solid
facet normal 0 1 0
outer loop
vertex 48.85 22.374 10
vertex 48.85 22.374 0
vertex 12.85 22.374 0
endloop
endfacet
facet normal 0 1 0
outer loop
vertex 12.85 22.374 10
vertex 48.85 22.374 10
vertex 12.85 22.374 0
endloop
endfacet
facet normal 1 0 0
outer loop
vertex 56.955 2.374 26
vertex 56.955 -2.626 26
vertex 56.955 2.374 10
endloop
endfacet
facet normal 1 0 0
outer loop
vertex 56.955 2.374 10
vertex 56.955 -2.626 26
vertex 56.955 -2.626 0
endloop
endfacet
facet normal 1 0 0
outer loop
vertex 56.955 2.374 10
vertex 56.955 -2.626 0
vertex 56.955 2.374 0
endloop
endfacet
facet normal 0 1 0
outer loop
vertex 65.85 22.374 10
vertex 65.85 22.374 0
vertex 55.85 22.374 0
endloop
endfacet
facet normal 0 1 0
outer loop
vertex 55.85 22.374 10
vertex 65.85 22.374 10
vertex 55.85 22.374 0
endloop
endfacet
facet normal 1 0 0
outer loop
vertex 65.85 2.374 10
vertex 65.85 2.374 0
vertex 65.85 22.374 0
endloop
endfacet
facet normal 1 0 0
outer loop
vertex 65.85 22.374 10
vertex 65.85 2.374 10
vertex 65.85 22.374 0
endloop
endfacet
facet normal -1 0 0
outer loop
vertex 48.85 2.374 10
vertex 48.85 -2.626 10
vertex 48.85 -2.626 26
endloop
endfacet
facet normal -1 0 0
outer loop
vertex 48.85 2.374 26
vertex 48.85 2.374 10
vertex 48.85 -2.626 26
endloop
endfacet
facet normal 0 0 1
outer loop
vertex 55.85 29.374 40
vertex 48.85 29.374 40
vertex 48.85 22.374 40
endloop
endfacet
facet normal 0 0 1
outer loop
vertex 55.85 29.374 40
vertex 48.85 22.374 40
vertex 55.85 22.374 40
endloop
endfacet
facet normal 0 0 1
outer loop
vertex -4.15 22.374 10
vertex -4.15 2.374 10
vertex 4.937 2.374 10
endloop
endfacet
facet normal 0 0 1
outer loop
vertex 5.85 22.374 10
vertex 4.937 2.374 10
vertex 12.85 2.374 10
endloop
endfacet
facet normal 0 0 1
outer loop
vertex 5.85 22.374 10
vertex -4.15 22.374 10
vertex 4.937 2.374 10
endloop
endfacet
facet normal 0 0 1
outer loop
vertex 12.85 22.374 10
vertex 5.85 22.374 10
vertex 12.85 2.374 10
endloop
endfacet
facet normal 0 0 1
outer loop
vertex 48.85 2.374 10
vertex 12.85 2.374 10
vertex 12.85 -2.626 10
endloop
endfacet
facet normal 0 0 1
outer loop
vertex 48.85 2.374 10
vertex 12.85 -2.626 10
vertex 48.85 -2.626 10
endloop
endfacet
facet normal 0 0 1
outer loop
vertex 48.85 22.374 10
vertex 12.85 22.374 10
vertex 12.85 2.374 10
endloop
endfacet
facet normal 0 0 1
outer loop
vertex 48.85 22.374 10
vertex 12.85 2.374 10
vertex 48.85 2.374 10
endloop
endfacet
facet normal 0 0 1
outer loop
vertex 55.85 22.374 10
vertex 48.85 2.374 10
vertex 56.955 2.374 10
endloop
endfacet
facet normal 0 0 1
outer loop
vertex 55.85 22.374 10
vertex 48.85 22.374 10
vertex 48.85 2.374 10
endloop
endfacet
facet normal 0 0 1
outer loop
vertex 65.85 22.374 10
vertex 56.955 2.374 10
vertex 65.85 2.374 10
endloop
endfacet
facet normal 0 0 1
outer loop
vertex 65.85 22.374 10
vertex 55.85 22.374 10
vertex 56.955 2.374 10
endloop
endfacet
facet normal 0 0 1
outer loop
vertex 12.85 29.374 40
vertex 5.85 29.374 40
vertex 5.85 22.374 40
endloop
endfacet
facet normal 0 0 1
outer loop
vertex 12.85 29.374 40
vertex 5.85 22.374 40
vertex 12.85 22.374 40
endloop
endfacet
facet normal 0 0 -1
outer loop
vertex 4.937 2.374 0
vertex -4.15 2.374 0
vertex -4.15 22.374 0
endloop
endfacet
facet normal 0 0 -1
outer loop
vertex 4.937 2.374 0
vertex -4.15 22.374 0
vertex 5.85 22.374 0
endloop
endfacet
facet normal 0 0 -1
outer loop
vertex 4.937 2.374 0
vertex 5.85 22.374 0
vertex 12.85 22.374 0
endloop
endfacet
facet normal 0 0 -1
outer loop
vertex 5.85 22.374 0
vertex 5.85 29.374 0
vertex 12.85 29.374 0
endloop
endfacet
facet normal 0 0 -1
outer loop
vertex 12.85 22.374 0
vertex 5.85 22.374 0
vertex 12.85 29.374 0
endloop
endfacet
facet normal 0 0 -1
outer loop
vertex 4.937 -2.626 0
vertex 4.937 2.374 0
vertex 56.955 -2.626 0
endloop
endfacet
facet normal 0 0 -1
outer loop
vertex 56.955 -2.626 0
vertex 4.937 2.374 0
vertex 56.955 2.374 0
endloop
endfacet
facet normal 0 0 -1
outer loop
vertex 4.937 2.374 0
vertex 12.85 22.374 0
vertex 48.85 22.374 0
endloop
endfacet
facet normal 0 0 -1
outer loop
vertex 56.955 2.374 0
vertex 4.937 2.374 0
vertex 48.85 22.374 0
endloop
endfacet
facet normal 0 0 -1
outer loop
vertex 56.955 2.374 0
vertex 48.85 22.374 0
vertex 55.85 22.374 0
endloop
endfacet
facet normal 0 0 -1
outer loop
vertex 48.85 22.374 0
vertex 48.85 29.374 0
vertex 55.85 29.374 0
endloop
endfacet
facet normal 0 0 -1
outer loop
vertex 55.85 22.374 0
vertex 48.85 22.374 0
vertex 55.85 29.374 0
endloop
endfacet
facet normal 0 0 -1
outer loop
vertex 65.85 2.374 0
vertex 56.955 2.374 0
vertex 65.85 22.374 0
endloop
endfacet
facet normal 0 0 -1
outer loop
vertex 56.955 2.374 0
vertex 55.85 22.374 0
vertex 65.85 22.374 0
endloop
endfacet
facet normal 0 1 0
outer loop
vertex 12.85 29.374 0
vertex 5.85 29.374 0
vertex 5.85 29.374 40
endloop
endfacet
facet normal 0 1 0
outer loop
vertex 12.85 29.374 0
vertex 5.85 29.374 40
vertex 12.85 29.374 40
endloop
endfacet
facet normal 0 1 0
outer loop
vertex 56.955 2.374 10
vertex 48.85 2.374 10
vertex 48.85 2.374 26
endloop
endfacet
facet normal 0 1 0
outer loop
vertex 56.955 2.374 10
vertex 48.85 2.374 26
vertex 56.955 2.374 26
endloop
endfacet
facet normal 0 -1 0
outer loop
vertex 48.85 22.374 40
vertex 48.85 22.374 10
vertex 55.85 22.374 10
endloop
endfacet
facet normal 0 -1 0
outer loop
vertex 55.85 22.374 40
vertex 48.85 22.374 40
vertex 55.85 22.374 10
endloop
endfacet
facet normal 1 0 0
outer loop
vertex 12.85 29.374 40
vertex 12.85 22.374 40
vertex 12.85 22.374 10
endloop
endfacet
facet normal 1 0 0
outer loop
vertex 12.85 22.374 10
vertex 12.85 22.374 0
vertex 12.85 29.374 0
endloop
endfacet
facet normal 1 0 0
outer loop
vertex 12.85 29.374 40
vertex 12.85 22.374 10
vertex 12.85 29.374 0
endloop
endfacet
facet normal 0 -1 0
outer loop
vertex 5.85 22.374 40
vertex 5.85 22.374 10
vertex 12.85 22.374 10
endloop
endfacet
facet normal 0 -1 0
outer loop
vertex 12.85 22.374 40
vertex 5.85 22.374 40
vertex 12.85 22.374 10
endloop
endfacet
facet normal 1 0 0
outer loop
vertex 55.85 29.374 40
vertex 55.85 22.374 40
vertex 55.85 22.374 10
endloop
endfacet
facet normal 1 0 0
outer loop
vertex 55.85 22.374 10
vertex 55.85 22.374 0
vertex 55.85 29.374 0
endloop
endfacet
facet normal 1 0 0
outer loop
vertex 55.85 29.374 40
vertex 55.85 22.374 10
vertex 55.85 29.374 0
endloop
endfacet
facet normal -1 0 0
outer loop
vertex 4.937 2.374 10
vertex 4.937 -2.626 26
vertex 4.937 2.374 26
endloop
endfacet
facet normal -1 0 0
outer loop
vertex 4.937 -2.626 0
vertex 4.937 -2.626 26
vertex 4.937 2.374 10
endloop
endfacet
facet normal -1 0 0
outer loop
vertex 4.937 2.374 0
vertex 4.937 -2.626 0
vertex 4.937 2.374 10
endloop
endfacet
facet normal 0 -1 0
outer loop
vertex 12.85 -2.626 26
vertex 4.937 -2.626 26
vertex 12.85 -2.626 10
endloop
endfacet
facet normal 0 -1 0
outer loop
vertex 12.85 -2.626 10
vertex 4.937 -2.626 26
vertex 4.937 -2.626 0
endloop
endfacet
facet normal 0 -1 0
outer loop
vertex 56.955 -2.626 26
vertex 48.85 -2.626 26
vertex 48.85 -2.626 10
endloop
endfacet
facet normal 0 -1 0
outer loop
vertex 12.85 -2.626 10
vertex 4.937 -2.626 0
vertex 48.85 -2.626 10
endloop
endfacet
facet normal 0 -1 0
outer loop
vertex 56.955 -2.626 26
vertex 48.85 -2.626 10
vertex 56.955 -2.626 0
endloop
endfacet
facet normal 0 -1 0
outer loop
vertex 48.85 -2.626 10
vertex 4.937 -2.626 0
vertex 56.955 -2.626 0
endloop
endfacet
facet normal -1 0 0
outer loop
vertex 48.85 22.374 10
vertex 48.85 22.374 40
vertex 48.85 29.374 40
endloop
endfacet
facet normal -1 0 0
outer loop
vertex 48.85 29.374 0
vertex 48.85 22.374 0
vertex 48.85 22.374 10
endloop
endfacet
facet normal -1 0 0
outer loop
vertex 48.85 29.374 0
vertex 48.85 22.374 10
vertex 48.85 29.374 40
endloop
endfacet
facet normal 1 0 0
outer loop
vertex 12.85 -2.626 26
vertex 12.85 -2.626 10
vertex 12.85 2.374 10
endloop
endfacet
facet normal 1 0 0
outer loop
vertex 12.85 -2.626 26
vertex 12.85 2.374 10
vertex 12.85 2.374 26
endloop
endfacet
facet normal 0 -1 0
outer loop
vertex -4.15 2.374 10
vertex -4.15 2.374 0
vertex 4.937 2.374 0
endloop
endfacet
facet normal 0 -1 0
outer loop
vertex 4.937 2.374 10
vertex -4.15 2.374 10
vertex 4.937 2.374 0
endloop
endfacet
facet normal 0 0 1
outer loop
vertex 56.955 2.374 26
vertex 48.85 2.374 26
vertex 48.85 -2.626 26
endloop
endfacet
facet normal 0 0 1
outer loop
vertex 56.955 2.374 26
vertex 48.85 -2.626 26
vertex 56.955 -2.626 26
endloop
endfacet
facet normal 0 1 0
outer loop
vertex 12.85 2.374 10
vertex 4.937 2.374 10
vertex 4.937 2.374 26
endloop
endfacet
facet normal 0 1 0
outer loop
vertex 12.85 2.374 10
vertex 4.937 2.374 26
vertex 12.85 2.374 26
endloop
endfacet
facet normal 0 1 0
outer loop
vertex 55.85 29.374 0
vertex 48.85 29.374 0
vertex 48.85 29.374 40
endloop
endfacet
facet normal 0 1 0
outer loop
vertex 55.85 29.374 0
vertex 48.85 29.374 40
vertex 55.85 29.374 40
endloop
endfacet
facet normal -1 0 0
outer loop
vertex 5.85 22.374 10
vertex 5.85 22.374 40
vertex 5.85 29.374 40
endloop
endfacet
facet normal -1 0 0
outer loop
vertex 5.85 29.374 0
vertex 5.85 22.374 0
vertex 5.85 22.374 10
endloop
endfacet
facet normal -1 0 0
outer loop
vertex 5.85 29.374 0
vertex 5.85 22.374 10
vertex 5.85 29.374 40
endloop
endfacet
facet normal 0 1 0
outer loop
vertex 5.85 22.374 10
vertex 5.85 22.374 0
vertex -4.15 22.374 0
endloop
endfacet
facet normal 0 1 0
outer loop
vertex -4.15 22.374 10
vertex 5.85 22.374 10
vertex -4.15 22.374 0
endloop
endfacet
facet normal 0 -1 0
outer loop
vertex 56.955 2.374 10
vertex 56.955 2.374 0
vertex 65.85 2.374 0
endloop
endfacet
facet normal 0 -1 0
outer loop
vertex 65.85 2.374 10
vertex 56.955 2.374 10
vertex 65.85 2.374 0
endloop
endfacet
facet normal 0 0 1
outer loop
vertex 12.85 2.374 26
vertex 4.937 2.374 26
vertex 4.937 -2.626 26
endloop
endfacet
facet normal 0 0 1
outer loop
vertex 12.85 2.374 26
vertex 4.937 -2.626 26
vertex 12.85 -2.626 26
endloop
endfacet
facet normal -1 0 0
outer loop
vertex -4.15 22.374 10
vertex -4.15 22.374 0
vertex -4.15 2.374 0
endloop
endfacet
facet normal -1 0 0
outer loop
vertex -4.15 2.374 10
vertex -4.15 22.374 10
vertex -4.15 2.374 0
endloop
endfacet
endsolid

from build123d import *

# Parameters (mm, degrees)
F0_W      = 7
F0_H      = 7
F1_DEPTH  = 10
F2_W      = 7
F2_H      = 7
F3_DEPTH  = 30
F4_W      = 52.018345
F4_H      = 10
F5_DEPTH  = 5
F6_W      = 52.018345
F6_H      = 5
F7_DEPTH  = 16
F8_W      = 36
F8_H      = 16
F9_DEPTH  = 25
F10_DEPTH = 25


with BuildPart() as f1:
    # F0 (on Top) → F1 (new body)
    with BuildSketch(Plane.XY):
        Polygon((65.849743, 2.373854), (65.849743, 22.373854), (55.849743, 22.373854), (48.849743, 22.373854), (12.849743, 22.373854), (5.849743, 22.373854), (-4.150257, 22.373854), (-4.150257, 2.373854), align=None)
        with Locations((52.349743, 25.873854)):
            Rectangle(F0_W, F0_H)
        with Locations((9.349743, 25.873854)):
            Rectangle(F0_W, F0_H)
    extrude(amount=F1_DEPTH)

    # F2 (on face) → F3 (join)
    with BuildSketch(Plane.XY.offset(10)):
        with Locations((9.349743, 25.873854)):
            Rectangle(F2_W, F2_H)
        with Locations((52.349743, 25.873854)):
            Rectangle(F2_W, F2_H)
    extrude(amount=F3_DEPTH)

    # F4 (on face) → F5 (join)
    with BuildSketch(Plane.XZ.offset(-2.373854)):
        with Locations((30.946101, 5)):
            Rectangle(F4_W, F4_H)
    extrude(amount=F5_DEPTH)

    # F6 (on face) → F7 (join)
    with BuildSketch(Plane.XY.offset(10)):
        with Locations((30.946101, -0.126146)):
            Rectangle(F6_W, F6_H)
    extrude(amount=F7_DEPTH)

    # F8 (on face) → F9 (cut)
    with BuildSketch(Plane.XZ.offset(2.626146)):
        with Locations((30.849743, 18)):
            Rectangle(F8_W, F8_H)
    extrude(amount=-F9_DEPTH, mode=Mode.SUBTRACT)

    # F8 (on face) → F10 (cut)
    with BuildSketch(Plane.XZ.offset(2.626146)):
        with Locations((30.849743, 18)):
            Rectangle(F8_W, F8_H)
    extrude(amount=-F10_DEPTH, mode=Mode.SUBTRACT)


solid = f1.part
